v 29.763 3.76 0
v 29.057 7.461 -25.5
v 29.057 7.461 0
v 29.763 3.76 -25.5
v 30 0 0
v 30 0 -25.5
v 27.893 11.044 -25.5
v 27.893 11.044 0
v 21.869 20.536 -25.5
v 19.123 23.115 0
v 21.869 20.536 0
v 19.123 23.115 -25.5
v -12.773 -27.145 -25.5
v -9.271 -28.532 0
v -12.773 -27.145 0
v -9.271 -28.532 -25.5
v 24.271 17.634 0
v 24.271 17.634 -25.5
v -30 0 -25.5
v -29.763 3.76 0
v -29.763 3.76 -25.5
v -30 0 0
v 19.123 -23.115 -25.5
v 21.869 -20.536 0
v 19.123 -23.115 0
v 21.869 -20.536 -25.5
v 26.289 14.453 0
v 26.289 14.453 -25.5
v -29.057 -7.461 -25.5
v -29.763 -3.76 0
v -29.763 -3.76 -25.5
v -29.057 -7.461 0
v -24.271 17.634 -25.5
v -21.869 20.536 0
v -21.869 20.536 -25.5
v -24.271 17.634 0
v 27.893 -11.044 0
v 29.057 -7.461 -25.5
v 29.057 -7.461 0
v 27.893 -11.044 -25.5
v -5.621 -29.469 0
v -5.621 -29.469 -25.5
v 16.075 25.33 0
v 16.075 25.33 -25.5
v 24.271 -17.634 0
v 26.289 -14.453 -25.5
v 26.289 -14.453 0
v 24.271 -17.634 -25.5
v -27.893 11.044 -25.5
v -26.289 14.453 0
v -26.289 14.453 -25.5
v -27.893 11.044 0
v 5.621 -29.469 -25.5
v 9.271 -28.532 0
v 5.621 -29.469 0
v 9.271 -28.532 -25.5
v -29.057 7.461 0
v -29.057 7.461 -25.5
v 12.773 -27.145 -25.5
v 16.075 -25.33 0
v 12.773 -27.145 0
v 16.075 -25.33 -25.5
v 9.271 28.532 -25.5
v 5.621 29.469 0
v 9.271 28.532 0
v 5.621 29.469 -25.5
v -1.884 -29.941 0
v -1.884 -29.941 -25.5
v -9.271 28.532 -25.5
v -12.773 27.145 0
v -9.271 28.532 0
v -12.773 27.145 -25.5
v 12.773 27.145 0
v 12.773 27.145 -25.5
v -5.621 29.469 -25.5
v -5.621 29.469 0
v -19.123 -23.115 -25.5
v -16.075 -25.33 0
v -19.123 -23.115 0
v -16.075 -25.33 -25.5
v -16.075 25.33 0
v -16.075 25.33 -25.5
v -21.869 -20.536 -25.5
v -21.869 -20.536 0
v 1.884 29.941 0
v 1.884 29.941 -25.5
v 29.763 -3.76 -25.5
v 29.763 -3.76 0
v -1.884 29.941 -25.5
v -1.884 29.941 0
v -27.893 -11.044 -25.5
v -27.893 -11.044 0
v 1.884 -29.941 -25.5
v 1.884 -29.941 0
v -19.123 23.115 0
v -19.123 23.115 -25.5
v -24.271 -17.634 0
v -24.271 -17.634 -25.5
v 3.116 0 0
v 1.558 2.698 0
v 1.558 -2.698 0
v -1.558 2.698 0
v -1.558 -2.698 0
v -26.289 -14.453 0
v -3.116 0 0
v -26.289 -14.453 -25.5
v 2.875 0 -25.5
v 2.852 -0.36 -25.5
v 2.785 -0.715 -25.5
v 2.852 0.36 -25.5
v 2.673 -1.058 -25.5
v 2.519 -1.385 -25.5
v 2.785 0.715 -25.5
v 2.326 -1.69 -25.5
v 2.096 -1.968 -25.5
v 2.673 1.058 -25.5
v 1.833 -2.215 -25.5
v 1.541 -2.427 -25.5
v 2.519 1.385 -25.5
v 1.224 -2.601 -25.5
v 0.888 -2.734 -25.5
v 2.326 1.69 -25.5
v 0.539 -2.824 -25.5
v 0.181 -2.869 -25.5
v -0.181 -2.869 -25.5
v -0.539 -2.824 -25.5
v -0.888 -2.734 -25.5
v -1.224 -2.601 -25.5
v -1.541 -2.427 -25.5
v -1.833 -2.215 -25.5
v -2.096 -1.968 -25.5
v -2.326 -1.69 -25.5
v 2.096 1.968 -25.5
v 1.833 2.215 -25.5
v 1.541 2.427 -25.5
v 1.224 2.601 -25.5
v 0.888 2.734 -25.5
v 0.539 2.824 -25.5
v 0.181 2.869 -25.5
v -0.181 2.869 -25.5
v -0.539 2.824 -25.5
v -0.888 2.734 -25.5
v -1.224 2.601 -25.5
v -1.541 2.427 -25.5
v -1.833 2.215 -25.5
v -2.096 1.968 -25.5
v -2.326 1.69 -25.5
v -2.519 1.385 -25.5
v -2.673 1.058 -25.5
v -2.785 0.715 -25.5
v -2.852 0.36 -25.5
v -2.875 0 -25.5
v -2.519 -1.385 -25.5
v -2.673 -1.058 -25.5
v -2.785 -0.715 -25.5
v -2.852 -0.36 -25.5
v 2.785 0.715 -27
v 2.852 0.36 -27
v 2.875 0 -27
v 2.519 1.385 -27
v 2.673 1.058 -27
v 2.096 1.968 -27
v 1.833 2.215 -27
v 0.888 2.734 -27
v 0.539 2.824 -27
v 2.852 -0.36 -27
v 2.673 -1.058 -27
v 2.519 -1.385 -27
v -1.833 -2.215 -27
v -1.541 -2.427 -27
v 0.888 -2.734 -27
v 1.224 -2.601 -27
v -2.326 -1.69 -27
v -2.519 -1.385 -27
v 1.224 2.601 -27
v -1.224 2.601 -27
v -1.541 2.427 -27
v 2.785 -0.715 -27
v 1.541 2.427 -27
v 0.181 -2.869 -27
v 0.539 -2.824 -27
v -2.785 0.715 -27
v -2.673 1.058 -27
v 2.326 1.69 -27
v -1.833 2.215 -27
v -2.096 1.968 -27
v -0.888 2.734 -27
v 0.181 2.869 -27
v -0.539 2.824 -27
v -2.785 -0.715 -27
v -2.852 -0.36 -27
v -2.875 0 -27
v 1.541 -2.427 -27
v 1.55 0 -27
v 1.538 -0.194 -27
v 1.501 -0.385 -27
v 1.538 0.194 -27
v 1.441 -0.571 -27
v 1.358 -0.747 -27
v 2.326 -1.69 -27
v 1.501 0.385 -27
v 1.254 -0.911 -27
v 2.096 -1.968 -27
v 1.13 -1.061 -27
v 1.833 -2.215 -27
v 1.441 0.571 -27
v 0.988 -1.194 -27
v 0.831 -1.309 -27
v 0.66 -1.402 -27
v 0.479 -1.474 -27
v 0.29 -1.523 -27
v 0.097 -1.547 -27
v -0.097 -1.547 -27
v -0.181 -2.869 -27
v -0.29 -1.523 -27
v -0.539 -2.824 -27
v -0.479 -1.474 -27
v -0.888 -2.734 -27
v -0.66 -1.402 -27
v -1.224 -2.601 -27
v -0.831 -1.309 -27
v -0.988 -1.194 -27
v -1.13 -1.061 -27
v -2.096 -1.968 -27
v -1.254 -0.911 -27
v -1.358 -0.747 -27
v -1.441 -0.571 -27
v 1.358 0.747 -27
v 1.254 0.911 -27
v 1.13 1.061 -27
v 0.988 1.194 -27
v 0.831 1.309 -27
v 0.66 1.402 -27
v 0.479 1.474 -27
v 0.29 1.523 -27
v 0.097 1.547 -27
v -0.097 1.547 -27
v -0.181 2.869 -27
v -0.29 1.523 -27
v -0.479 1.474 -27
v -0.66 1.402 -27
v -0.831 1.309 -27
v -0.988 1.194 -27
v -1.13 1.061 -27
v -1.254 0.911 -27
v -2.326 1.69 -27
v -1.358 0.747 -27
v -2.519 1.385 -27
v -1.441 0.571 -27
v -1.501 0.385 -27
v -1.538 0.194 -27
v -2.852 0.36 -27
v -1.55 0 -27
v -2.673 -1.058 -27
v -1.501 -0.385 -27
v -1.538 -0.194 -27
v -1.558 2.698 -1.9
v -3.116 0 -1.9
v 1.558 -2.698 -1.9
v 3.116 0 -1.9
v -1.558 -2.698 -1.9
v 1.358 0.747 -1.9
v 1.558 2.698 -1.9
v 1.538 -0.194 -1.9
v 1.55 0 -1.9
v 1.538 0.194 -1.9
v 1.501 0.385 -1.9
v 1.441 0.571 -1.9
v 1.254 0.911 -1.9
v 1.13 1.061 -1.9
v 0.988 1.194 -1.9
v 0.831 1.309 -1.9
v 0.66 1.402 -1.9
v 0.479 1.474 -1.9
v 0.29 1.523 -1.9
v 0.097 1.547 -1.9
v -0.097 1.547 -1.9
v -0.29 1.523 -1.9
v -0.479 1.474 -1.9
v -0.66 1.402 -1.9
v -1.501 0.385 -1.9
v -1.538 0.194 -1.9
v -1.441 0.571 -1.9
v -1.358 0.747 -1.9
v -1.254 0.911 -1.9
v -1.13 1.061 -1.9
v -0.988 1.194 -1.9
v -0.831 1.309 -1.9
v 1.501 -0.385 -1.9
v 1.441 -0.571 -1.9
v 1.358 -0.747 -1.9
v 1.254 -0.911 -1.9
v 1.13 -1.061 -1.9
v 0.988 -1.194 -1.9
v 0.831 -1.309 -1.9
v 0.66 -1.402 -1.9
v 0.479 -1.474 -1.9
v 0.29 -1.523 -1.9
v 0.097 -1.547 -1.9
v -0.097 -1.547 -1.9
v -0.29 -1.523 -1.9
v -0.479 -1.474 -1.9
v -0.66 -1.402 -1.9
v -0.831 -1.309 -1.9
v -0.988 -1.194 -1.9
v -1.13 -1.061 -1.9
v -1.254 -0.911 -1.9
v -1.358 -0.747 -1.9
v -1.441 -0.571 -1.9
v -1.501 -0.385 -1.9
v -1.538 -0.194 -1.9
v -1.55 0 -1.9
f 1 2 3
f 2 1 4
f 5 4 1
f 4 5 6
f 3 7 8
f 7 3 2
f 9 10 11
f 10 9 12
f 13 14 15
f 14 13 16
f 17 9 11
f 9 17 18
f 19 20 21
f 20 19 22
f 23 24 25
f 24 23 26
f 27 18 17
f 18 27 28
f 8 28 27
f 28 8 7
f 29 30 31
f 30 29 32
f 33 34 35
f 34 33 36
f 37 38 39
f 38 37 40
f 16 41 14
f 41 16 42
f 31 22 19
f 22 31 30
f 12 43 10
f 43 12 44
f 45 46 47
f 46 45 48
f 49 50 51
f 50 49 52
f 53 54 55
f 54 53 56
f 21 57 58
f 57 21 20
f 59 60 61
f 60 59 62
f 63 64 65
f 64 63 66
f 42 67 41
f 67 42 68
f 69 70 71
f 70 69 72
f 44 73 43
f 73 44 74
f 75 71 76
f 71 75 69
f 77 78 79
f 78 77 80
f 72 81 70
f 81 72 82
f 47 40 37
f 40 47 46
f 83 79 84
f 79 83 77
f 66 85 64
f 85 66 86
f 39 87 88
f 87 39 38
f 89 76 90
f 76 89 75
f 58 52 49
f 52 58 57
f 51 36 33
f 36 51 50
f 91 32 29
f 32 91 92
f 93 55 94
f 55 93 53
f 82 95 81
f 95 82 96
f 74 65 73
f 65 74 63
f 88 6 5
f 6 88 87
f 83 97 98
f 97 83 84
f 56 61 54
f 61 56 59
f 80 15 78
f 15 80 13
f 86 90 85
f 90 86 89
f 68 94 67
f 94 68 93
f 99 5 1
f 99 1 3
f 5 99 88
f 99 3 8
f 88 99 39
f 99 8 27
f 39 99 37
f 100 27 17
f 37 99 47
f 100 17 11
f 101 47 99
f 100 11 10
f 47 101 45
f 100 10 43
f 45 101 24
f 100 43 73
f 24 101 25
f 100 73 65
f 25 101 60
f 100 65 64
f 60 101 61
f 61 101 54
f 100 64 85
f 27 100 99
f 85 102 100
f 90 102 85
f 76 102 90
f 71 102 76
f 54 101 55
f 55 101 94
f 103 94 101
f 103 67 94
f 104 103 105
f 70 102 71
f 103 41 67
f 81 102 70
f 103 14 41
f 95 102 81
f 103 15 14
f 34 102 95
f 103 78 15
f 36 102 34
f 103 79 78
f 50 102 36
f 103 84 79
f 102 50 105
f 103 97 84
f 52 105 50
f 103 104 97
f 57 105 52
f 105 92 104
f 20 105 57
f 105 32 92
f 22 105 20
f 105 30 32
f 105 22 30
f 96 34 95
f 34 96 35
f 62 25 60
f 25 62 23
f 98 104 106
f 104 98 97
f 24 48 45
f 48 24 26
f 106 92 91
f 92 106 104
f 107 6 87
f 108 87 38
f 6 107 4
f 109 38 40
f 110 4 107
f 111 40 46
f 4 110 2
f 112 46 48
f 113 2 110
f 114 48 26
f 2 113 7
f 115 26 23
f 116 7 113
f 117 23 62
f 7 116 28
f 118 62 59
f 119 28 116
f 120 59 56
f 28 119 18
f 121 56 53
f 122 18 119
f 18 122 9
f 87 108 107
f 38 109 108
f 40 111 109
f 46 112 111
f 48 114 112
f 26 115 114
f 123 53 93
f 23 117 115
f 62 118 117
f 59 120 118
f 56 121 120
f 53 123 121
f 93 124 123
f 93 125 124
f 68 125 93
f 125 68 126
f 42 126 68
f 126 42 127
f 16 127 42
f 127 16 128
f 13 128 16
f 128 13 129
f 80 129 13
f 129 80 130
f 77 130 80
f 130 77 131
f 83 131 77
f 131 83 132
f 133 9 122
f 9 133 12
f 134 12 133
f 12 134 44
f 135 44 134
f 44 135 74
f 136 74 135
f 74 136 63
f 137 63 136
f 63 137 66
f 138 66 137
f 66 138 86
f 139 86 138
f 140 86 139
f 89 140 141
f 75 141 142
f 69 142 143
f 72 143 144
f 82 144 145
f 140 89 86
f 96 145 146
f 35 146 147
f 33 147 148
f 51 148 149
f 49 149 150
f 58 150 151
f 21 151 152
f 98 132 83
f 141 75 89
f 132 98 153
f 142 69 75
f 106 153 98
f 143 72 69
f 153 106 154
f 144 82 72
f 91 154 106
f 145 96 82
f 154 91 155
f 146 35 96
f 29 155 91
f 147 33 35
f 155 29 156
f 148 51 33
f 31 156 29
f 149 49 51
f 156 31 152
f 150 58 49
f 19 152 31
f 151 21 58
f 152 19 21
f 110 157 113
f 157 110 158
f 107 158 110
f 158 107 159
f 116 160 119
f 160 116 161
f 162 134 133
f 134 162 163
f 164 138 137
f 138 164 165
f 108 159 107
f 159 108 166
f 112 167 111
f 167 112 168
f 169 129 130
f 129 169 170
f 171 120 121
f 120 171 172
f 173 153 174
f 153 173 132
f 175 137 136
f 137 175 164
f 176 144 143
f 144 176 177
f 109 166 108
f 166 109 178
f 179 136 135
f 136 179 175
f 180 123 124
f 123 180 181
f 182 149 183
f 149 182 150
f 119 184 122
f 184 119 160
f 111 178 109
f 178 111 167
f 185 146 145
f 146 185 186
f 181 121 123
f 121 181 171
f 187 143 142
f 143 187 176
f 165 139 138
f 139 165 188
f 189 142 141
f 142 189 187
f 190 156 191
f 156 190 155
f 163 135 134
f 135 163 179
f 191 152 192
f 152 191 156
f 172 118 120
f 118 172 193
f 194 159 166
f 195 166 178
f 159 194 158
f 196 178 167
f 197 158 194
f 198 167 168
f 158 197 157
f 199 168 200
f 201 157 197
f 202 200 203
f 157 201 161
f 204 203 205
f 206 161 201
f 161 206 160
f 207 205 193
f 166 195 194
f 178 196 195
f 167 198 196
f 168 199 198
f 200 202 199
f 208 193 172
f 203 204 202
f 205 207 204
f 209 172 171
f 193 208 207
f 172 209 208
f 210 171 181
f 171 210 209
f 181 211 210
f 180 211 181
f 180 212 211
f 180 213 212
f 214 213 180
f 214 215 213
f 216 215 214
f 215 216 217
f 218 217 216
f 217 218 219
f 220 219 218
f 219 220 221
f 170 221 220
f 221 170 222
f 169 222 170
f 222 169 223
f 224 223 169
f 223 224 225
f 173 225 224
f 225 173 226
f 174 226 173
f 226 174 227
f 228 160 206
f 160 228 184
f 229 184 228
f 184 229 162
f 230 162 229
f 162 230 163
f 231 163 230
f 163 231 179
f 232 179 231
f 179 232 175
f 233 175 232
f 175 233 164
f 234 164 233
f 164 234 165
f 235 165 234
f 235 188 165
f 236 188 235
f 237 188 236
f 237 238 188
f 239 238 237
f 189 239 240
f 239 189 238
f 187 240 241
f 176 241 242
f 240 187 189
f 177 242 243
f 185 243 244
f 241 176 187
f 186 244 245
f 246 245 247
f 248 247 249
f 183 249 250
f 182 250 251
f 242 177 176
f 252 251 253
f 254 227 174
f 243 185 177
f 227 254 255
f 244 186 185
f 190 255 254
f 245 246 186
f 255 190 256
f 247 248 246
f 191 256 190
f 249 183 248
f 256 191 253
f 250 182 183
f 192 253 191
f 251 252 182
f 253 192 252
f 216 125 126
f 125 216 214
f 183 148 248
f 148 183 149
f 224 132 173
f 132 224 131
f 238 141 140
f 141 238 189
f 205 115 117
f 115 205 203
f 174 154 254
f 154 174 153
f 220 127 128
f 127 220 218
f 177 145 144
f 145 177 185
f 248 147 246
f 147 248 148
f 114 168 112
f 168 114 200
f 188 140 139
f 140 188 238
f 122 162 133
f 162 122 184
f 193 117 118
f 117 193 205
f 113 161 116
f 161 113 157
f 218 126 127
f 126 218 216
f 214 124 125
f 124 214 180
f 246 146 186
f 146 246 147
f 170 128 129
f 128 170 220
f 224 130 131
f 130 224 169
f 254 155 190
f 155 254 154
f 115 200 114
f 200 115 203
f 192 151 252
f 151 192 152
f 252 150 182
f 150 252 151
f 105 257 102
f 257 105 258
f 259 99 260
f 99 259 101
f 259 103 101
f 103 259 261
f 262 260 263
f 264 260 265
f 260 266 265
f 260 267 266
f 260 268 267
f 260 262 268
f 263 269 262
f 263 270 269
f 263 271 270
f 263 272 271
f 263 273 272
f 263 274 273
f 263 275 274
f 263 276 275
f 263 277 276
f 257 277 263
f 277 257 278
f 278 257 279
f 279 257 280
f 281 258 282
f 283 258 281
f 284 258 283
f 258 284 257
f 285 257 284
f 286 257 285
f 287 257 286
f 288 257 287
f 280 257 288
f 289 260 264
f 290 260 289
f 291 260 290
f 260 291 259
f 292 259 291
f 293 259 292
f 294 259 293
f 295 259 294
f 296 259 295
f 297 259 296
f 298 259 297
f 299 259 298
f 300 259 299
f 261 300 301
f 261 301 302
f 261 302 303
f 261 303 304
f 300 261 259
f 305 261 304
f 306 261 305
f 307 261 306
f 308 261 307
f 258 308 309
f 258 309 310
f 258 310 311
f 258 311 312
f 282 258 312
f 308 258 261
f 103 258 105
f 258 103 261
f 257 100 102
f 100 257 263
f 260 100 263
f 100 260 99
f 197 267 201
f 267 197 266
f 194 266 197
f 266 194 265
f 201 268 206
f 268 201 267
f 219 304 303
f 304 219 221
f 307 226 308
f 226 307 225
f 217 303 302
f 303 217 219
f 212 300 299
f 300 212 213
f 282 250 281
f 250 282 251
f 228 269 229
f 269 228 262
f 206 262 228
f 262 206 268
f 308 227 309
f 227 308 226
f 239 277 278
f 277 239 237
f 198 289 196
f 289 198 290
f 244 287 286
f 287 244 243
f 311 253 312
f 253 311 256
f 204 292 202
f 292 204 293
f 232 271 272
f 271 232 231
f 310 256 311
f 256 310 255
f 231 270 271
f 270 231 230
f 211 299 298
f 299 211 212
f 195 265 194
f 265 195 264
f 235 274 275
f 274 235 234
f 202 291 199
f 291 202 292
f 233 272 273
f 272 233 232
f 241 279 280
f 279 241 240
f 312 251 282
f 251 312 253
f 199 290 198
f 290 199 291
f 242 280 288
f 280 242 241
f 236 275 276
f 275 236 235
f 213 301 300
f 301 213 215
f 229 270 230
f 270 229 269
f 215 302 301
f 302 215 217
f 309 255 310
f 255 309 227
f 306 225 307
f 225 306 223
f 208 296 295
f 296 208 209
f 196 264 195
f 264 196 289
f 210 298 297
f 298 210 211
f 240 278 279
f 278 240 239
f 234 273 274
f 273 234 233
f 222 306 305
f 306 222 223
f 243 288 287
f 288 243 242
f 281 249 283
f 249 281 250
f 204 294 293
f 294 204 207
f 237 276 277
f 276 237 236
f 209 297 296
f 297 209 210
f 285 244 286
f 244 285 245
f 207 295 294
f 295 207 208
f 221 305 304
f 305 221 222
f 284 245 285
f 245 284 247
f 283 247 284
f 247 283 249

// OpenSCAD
$fn = 50;

difference() {
	union() {
		translate(v = [0, 0, -25.5]) {
			cylinder(h = 25.5, r = 30.0);
		}
		#translate(v = [0, 0, -27.0]) {
			cylinder(h = 27, r = 2.875);
		}
	}
	union() {
		translate(v = [0, 0, 0]) {
			rotate(a = [0, 0, 0]) {
				difference() {
					union() {
						translate(v = [0, 0, -1.9]) {
							linear_extrude(height = 1.9) {
								polygon(points = [[3.1158, 0.0], [1.5579000000000005, 2.698361953111554], [-1.5578999999999994, 2.6983619531115544], [-3.1158, 3.815754496783323e-16], [-1.5579000000000014, -2.6983619531115535], [1.557899999999998, -2.6983619531115552]]);
							}
						}
					}
					union();
				}
			}
		}
		#translate(v = [0, 0, -100.0]) {
			cylinder(h = 200, r = 1.55);
		}
	}
}
